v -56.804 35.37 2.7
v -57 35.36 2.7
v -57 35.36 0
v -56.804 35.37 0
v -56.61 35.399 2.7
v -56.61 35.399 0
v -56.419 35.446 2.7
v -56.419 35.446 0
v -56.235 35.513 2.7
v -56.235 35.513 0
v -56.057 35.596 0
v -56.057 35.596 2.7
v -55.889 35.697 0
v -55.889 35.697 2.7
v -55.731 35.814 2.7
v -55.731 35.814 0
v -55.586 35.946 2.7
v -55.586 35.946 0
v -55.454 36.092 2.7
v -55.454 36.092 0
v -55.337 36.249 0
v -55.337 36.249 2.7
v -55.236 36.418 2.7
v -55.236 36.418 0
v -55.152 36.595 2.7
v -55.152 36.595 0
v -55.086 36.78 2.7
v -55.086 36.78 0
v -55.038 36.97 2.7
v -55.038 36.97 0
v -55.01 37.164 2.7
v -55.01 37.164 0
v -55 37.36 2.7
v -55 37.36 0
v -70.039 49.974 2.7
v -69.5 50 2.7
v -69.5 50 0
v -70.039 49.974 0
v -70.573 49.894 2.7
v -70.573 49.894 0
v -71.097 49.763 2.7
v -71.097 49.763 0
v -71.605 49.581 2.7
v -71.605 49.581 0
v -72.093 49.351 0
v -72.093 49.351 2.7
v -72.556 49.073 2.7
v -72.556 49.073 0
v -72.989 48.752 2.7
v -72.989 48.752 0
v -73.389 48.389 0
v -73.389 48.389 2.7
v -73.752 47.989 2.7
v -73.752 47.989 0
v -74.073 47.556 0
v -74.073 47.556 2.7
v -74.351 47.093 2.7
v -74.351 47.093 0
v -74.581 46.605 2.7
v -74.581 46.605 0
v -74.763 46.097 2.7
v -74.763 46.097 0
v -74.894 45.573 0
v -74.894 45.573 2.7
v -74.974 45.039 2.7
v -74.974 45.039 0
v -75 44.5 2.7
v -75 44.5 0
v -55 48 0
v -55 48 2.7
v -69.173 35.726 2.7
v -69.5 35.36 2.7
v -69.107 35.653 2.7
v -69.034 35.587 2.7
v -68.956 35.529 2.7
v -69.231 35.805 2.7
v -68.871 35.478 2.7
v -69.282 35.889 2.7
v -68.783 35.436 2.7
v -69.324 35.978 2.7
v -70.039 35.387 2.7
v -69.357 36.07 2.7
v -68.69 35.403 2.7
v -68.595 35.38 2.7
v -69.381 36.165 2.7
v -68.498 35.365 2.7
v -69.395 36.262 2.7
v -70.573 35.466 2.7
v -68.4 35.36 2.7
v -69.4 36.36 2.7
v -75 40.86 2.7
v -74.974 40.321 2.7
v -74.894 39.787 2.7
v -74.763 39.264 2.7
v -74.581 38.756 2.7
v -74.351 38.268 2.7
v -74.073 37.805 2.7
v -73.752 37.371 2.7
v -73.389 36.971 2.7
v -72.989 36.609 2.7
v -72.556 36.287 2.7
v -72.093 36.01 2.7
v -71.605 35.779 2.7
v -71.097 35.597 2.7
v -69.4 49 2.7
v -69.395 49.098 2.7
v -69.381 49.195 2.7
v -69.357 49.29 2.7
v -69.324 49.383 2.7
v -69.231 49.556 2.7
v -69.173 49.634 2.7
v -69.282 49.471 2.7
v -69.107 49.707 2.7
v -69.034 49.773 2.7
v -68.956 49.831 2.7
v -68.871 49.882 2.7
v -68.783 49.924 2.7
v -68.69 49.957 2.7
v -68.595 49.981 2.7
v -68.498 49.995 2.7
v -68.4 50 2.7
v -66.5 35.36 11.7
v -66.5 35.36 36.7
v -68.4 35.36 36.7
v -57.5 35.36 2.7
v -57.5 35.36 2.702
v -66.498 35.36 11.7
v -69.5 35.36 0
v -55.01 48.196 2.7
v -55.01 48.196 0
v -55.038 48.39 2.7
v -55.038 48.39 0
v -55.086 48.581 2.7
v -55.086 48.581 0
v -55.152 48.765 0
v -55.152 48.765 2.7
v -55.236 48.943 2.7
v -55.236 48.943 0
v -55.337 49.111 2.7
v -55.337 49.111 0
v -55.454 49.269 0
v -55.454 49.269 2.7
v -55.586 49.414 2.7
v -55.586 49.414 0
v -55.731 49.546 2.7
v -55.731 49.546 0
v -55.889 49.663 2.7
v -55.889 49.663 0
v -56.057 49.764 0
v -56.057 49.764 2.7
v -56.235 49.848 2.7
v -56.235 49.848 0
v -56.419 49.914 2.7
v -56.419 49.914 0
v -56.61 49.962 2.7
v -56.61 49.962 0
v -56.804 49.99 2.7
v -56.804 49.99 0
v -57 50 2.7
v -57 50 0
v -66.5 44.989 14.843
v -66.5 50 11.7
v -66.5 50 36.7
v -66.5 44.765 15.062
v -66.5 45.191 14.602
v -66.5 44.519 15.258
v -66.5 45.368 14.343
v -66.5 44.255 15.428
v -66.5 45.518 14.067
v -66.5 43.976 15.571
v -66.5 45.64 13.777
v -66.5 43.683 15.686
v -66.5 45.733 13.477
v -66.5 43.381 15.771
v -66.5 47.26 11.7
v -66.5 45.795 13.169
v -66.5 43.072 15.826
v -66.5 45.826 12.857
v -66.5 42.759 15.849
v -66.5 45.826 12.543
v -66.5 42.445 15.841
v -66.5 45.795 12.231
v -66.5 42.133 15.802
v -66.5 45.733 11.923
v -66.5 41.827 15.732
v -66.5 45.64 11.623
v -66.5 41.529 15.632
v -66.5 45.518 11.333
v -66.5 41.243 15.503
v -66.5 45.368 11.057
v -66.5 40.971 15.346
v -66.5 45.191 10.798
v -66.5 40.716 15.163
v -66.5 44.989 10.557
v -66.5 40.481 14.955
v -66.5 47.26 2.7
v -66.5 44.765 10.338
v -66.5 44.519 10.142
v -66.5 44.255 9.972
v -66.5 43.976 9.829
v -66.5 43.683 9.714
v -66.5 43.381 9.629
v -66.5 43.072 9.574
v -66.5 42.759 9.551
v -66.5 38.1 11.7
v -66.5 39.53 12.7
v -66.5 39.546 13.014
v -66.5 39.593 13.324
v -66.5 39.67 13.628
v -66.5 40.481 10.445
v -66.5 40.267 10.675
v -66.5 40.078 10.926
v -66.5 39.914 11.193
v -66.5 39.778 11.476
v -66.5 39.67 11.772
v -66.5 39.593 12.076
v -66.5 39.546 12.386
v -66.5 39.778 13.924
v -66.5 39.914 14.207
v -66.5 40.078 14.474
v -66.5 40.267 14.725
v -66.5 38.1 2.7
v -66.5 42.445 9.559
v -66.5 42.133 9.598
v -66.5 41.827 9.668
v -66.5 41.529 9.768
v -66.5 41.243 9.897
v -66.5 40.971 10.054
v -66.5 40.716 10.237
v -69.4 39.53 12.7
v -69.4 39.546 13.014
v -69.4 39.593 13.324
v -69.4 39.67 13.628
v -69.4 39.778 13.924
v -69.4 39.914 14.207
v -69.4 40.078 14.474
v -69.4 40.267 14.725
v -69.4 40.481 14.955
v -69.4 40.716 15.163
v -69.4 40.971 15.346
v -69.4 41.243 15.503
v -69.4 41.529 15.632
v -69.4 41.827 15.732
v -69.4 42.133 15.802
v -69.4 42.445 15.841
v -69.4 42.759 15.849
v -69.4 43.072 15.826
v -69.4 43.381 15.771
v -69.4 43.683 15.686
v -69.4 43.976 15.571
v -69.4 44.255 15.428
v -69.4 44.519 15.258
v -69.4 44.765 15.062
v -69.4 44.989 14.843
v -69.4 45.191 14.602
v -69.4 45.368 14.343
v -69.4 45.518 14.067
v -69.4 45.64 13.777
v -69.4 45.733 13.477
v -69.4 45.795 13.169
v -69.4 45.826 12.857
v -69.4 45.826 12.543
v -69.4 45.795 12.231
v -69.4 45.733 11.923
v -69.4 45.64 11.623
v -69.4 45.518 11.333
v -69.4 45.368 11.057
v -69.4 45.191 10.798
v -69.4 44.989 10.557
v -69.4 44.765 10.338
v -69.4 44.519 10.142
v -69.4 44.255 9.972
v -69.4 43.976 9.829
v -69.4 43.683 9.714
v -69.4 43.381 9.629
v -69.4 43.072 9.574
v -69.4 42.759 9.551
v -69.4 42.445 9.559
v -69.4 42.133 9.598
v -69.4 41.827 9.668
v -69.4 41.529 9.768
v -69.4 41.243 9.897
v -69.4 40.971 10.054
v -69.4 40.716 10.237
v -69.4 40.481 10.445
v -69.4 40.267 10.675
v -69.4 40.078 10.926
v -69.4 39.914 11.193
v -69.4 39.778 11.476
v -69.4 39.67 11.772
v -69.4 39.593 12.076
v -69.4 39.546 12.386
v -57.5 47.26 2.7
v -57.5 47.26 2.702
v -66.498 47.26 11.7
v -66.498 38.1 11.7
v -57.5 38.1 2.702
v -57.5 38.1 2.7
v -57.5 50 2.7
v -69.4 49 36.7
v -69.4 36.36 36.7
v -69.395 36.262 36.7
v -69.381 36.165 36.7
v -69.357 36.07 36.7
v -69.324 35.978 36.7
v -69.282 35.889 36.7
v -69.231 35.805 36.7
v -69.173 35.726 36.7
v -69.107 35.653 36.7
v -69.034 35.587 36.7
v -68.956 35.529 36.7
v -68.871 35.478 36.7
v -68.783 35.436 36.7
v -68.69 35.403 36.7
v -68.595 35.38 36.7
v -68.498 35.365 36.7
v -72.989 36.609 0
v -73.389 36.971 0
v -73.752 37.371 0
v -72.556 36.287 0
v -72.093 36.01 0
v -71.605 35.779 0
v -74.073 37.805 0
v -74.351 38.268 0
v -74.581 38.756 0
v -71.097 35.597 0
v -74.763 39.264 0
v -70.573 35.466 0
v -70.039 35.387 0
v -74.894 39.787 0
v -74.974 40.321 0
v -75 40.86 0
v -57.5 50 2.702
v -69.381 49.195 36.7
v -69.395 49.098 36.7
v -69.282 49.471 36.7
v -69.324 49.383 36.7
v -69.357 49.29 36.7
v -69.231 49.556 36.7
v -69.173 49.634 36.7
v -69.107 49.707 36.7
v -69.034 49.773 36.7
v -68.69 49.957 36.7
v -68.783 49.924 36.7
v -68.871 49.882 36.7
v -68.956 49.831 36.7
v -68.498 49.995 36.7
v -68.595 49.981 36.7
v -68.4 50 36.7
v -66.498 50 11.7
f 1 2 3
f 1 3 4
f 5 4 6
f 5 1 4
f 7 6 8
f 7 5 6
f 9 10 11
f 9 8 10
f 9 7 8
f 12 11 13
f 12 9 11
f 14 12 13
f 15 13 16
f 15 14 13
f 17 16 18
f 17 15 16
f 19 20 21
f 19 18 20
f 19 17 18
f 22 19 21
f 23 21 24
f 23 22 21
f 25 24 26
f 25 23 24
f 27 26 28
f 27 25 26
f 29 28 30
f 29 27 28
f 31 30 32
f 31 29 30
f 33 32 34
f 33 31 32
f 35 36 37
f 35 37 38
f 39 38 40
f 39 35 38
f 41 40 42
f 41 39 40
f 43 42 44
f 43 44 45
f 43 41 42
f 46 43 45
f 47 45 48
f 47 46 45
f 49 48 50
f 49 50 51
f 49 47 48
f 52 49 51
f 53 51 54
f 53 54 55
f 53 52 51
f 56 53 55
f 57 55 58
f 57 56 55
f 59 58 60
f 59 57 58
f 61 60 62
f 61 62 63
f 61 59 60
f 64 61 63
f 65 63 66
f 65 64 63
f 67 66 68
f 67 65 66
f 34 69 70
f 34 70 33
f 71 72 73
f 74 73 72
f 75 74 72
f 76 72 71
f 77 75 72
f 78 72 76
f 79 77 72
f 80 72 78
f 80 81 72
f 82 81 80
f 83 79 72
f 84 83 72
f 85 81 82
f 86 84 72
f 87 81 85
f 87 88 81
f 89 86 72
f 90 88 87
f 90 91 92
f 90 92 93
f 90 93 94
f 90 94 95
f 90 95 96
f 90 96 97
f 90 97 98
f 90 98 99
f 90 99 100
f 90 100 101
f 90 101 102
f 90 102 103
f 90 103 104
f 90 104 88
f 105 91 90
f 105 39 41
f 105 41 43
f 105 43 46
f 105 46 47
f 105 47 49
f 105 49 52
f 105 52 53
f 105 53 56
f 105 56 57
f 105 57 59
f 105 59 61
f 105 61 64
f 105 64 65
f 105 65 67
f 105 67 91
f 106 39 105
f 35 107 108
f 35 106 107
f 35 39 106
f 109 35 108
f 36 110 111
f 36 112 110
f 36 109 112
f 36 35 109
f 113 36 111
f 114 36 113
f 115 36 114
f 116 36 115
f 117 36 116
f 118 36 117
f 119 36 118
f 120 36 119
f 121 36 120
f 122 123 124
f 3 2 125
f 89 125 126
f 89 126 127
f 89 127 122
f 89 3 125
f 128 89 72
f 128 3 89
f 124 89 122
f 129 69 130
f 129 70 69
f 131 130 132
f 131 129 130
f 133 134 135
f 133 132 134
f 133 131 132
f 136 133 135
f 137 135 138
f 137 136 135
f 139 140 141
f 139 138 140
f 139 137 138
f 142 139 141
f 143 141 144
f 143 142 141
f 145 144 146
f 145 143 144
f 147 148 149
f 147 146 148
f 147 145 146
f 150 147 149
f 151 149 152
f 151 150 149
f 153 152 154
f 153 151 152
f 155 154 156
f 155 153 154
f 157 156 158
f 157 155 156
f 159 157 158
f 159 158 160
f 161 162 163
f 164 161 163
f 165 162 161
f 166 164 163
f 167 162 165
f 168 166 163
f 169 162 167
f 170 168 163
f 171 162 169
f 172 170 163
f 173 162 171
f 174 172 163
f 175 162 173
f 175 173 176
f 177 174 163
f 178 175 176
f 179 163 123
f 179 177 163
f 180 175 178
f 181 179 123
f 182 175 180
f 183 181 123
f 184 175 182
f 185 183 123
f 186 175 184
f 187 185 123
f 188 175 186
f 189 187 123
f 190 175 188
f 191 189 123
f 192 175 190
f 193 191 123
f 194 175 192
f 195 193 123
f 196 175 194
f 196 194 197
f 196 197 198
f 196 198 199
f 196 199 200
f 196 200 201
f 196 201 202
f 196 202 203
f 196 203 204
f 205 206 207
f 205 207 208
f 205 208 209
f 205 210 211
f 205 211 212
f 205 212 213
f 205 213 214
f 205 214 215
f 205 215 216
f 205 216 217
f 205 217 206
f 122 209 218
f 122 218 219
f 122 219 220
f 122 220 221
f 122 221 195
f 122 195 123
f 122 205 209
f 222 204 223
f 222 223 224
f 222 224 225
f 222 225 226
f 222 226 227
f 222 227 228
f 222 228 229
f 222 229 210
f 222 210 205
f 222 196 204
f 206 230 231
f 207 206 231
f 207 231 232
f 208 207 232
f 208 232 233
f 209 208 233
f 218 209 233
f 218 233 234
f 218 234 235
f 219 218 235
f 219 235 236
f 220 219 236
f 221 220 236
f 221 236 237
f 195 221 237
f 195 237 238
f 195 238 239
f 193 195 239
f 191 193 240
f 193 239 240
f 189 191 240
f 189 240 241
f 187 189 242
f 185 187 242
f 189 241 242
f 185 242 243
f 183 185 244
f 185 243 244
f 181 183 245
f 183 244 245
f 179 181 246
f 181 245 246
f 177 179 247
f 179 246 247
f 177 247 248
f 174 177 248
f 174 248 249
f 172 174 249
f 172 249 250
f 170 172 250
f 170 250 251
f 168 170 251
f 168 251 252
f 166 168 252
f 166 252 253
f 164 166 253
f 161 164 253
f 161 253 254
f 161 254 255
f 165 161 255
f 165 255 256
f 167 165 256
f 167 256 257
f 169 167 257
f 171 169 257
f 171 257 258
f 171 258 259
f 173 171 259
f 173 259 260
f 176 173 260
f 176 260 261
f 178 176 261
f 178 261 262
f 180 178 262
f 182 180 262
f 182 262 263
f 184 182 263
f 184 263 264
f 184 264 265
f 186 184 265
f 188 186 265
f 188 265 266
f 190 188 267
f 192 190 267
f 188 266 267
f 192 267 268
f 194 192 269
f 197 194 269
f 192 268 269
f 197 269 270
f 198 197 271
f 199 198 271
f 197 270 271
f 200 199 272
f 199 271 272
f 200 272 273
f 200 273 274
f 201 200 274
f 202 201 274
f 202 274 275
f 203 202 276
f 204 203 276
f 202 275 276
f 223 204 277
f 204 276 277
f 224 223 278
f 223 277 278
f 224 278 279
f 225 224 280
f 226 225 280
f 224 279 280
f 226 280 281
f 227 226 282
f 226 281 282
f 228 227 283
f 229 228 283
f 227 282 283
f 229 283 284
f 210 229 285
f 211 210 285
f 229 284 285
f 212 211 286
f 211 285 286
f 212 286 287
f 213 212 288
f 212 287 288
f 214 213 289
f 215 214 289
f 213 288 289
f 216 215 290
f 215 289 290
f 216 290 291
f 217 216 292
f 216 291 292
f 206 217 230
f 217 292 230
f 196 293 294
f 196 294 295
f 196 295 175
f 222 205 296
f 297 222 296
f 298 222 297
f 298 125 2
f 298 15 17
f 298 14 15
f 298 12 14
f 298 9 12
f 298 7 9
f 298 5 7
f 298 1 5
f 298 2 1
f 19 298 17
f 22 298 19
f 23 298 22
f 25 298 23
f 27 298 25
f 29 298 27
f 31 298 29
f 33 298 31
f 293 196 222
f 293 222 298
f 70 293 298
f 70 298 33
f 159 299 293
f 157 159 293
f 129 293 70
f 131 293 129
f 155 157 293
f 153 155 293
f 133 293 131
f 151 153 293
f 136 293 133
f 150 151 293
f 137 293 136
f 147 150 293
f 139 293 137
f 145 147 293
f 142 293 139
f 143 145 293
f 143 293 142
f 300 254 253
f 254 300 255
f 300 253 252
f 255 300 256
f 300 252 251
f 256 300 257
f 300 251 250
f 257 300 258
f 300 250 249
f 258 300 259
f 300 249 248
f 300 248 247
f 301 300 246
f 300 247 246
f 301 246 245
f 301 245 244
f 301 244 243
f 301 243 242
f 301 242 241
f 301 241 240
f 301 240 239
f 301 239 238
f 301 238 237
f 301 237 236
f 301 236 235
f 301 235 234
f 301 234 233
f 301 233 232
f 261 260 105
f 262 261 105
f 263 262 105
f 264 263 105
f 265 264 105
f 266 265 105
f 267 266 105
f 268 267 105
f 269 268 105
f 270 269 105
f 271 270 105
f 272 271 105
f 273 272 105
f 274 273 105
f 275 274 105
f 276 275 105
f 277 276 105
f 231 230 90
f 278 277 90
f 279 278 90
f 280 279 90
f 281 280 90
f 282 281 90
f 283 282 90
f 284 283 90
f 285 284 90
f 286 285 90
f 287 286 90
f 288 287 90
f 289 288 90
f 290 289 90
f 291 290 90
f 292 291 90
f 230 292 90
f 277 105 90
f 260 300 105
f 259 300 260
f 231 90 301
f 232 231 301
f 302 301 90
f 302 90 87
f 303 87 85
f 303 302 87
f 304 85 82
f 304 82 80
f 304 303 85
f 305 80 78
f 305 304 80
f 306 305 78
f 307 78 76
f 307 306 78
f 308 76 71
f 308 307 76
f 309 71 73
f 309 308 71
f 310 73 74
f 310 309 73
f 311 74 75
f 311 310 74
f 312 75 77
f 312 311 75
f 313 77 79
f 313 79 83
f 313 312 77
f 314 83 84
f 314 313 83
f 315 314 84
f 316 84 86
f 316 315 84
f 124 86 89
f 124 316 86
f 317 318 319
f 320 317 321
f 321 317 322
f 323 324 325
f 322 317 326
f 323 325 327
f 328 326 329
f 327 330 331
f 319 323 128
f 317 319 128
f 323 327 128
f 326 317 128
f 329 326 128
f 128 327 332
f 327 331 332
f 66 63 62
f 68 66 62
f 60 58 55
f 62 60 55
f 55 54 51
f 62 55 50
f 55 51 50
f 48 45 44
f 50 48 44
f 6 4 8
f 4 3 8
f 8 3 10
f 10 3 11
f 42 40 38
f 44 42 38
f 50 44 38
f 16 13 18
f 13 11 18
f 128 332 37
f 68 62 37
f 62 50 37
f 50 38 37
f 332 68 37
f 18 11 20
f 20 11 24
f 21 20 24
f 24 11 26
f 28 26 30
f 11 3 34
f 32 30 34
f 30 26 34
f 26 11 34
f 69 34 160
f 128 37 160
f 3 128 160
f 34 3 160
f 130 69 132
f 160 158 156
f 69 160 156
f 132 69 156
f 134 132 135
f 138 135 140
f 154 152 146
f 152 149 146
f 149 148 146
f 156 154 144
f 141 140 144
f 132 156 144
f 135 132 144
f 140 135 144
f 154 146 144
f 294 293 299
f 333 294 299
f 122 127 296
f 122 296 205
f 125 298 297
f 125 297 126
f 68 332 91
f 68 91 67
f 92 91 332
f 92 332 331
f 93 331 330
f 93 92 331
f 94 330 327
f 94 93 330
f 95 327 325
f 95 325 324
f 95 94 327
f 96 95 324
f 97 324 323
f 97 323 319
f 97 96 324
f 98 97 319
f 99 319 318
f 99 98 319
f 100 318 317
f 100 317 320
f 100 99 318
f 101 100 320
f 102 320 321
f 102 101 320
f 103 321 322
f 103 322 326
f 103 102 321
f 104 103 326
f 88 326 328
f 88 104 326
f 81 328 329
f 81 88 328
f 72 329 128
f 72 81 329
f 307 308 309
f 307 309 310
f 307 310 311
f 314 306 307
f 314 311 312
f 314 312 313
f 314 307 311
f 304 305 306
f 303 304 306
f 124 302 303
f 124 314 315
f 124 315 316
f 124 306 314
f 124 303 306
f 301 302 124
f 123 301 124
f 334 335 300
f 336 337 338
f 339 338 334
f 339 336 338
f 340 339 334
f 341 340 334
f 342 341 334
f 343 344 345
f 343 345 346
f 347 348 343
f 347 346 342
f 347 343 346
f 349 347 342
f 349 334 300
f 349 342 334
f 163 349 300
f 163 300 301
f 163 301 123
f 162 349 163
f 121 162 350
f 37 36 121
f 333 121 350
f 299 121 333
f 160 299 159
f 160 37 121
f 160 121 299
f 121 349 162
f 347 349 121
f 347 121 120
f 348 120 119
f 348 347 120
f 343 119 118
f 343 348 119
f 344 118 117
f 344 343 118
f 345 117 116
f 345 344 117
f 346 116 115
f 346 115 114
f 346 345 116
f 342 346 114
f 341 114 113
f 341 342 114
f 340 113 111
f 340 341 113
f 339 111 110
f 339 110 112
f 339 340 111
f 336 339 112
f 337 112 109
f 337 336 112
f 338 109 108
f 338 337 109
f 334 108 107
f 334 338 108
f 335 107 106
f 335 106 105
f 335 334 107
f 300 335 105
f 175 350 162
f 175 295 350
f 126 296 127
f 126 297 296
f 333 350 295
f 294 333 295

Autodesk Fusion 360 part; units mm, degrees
sketch "Skizze1" plane through (0, 0, 0) normal (0, 0, 1) x (1, 0, 0)
  line L0 (-75, 50) -> (-55, 50)
  line L1 (-55, 50) -> (-55, 35.3603)
  line L2 (-55, 35.3603) -> (-75, 35.3603)
  line L3 (-75, 35.3603) -> (-75, 50)
  line L4 (-69.4, 50) -> (-69.4, 35.3603)
  line L5 (-66.5, 50) -> (-66.5, 35.3603)
  dimension "d1" = 20
  dimension "d2" = 5.6
  dimension "d3" = 2.9
extrude "Extrusion1" add sketch "Skizze1" along normal blind 2.7 contours L0 L2 L3 L4 | L0 L1 L2 L5 makes body 1 at (-73.1333, 45.1201, 0) makes body 2 at (-62.6667, 45.1201, 0)
extrude "Extrusion2" add sketch "Skizze1" along normal blind 36.7 contours L0 L2 L4 L5 bodies 1 2
sketch "Skizze2" plane through (-69.4, 0, 0) normal (-1, 0, 0) x (0, -1, 0)
  line L0 (-50, 2.7) -> (-35.3603, 2.7)
  line L1 (-35.3603, 2.7) -> (-35.3603, 36.7)
  line L2 (-35.3603, 36.7) -> (-50, 36.7)
  line L3 (-50, 36.7) -> (-50, 2.7)
  line L4 (-42.6802, 2.7) -> (-42.6802, 36.7) construction
  line L5 (-50, 12.7) -> (-35.3603, 12.7) construction
  line L6 (-50, 2.7) -> (-35.3603, 2.7) construction
  circle A0 centre (-42.6802, 12.7) radius 3.15
  dimension "d8" = 10
  dimension "d9" = 6.3
extrude "Extrusion3" cut sketch "Skizze2" against normal blind 3 contours A0 bodies 1
fillet "Abrundung1" radius 5.5 2 edges at (-75, 50, 1.35) (-75, 35.3603, 1.35) on bodies 1
sketch "Skizze3" plane through (0, 0, 2.7) normal (0, 0, 1) x (-1, 0, 0)
  line L0 (55, -50) -> (66.5, -50)
  line L1 (66.5, -50) -> (66.5, -35.3603)
  line L2 (66.5, -35.3603) -> (55, -35.3603)
  line L3 (55, -35.3603) -> (55, -50)
  line L4 (66.5, -38.1003) -> (55, -38.1003)
  line L5 (55, -47.26) -> (66.5, -47.26)
  line L6 (57.5, -38.1003) -> (57.5, -35.3603)
  line L7 (57.5, -47.26) -> (57.5, -50)
  dimension "d14" = 2.74
  dimension "d15" = 2.74
  dimension "d16" = 9
  dimension "d17" = 9
extrude "Extrusion4" add sketch "Skizze3" along normal blind 9 contours L0 L1 L5 L7 | L1 L2 L4 L6 bodies 1
chamfer "Fase2" distance 9 angle 45 2 edges at (-57.5, 36.7303, 11.7) (-57.5, 48.63, 11.7) on bodies 1
fillet "Abrundung2" radius 1 2 edges at (-69.4, 50, 19.7) (-69.4, 35.3603, 19.7) on bodies 1
fillet "Abrundung3" radius 2 2 edges at (-55, 50, 1.35) (-55, 35.3603, 1.35) on bodies 1
equation "d6 = 34 mm + 2.7 mm"
equation "d18 = 15 mm - 2.7 mm - 3.3 mm"
